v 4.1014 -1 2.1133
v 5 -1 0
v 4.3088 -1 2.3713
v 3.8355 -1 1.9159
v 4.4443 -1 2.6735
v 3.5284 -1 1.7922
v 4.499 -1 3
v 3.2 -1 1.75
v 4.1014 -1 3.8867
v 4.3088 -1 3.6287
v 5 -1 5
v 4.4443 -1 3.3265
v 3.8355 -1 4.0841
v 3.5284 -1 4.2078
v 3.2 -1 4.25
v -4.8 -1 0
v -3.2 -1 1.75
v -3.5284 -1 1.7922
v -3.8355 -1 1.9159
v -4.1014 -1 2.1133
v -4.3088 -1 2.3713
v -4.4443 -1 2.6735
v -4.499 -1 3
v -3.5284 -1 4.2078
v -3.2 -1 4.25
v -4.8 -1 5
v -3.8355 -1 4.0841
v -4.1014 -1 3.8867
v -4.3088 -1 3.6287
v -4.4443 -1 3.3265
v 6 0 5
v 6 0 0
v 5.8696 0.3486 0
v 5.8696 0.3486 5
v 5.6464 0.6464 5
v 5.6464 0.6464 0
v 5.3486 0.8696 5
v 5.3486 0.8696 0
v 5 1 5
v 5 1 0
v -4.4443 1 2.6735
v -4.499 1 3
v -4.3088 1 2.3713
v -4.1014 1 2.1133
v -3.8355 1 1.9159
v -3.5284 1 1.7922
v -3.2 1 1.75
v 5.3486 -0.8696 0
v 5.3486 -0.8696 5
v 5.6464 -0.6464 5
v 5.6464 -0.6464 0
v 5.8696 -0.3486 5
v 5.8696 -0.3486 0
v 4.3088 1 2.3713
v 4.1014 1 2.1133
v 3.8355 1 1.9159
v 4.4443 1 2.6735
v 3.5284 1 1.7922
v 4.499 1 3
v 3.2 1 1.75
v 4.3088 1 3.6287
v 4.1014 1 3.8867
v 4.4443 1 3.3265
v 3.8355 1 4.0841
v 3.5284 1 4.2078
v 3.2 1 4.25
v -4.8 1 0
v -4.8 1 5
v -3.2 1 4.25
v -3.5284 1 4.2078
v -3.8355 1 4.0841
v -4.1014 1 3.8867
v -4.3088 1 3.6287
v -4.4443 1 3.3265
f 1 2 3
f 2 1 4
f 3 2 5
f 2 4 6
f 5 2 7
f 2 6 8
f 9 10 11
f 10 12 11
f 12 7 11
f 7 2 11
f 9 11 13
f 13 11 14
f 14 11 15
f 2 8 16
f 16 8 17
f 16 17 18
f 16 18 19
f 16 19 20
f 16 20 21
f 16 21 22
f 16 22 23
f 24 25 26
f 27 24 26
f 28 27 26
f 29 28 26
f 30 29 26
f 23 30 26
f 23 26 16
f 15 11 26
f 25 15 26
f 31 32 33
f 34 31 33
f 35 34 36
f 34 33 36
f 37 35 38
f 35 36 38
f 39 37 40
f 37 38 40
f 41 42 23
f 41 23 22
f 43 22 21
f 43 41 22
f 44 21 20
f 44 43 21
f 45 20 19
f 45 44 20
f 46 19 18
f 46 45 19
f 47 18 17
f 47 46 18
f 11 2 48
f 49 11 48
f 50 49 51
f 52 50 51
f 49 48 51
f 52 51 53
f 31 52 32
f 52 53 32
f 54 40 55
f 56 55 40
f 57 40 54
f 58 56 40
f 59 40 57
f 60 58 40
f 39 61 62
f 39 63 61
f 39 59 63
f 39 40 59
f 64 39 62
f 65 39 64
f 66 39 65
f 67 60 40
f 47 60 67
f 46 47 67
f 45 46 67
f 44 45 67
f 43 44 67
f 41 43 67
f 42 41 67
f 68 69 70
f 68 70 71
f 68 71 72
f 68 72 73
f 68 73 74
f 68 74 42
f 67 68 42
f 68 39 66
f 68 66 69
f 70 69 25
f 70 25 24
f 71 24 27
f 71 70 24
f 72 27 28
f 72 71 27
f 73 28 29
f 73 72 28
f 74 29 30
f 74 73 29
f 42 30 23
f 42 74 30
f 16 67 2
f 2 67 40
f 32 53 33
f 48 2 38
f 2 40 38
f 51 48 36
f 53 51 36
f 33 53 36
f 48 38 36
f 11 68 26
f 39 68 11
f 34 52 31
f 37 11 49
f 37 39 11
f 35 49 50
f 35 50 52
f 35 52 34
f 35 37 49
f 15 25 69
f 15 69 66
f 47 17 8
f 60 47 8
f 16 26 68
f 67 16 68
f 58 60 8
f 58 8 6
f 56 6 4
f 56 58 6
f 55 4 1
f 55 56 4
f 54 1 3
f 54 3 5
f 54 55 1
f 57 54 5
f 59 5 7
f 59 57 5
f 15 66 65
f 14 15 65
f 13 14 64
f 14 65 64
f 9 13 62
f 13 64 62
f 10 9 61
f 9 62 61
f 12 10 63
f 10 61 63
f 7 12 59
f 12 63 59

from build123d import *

# Parameters (mm, degrees)
F1_DEPTH    = 5
F2_W        = 9
F2_H        = 2.5
F3_DEPTH    = 2.001
F4_T1_DEPTH = 2
F6_DEPTH    = 5.001


# Not quite as in the source:
# - a fillet or chamfer that OpenCascade refuses, or shapes differently, is made with other operations: its cross-section is extruded or revolved along the edge and cut away or added


with BuildPart() as f1:
    # F0 (on Top) → F1 (new body)
    with BuildSketch(Plane.XY):
        with BuildLine():
            Line((5, 1), (-5, 1))
            ThreePointArc((-5, 1), (-5.6464466094, 0.6464466094), (-6, 0))
            ThreePointArc((-6, 0), (-5.6464466094, -0.6464466094), (-5, -1))
            Line((-5, -1), (5, -1))
            ThreePointArc((5, -1), (5.6464466094, -0.6464466094), (6, 0))
            ThreePointArc((6, 0), (5.6464466094, 0.6464466094), (5, 1))
        make_face()
    extrude(amount=F1_DEPTH)

    # F2 (on face) → F3 (cut, through all)
    with BuildSketch(Plane.XZ.offset(1)):
        with Locations((0, 3)):
            Rectangle(F2_W, F2_H)
    extrude(amount=-F3_DEPTH, mode=Mode.SUBTRACT)

    # F4: fillet of radius 1.3 on 4 edges, made by hand

    # F4_s2 → F4_t1 (join)
    with BuildSketch(Plane.XZ.offset(-1)):
        with BuildLine():
            ThreePointArc((-4.5, 3.05), (-4.1192388155, 2.1307611845), (-3.2, 1.75))
            Line((-3.2, 1.75), (-4.5, 1.75))
            Line((-4.5, 1.75), (-4.5, 3.05))
        make_face()
        with BuildLine():
            ThreePointArc((-3.2, 4.25), (-4.1192388155, 3.8692388155), (-4.5, 2.95))
            Line((-4.5, 2.95), (-4.5, 4.25))
            Line((-4.5, 4.25), (-3.2, 4.25))
        make_face()
        with BuildLine():
            ThreePointArc((3.2, 4.25), (4.1192388155, 3.8692388155), (4.5, 2.95))
            Line((4.5, 2.95), (4.5, 4.25))
            Line((4.5, 4.25), (3.2, 4.25))
        make_face()
        with BuildLine():
            ThreePointArc((3.2, 1.75), (4.1192388155, 2.1307611845), (4.5, 3.05))
            Line((4.5, 3.05), (4.5, 1.75))
            Line((4.5, 1.75), (3.2, 1.75))
        make_face()
    extrude(amount=F4_T1_DEPTH)

    # F5 (on face) → F6 (cut, through all)
    with BuildSketch(Plane.XY.offset(5)):
        with BuildLine():
            Line((-4.8, -1), (-4.8, 1))
            Line((-4.8, 1), (-5, 1))
            ThreePointArc((-5, 1), (-5.6464466094, 0.6464466094), (-6, 0))
            ThreePointArc((-6, 0), (-5.6464466094, -0.6464466094), (-5, -1))
            Line((-5, -1), (-4.8, -1))
        make_face()
    extrude(amount=-F6_DEPTH, mode=Mode.SUBTRACT)


solid = f1.part
